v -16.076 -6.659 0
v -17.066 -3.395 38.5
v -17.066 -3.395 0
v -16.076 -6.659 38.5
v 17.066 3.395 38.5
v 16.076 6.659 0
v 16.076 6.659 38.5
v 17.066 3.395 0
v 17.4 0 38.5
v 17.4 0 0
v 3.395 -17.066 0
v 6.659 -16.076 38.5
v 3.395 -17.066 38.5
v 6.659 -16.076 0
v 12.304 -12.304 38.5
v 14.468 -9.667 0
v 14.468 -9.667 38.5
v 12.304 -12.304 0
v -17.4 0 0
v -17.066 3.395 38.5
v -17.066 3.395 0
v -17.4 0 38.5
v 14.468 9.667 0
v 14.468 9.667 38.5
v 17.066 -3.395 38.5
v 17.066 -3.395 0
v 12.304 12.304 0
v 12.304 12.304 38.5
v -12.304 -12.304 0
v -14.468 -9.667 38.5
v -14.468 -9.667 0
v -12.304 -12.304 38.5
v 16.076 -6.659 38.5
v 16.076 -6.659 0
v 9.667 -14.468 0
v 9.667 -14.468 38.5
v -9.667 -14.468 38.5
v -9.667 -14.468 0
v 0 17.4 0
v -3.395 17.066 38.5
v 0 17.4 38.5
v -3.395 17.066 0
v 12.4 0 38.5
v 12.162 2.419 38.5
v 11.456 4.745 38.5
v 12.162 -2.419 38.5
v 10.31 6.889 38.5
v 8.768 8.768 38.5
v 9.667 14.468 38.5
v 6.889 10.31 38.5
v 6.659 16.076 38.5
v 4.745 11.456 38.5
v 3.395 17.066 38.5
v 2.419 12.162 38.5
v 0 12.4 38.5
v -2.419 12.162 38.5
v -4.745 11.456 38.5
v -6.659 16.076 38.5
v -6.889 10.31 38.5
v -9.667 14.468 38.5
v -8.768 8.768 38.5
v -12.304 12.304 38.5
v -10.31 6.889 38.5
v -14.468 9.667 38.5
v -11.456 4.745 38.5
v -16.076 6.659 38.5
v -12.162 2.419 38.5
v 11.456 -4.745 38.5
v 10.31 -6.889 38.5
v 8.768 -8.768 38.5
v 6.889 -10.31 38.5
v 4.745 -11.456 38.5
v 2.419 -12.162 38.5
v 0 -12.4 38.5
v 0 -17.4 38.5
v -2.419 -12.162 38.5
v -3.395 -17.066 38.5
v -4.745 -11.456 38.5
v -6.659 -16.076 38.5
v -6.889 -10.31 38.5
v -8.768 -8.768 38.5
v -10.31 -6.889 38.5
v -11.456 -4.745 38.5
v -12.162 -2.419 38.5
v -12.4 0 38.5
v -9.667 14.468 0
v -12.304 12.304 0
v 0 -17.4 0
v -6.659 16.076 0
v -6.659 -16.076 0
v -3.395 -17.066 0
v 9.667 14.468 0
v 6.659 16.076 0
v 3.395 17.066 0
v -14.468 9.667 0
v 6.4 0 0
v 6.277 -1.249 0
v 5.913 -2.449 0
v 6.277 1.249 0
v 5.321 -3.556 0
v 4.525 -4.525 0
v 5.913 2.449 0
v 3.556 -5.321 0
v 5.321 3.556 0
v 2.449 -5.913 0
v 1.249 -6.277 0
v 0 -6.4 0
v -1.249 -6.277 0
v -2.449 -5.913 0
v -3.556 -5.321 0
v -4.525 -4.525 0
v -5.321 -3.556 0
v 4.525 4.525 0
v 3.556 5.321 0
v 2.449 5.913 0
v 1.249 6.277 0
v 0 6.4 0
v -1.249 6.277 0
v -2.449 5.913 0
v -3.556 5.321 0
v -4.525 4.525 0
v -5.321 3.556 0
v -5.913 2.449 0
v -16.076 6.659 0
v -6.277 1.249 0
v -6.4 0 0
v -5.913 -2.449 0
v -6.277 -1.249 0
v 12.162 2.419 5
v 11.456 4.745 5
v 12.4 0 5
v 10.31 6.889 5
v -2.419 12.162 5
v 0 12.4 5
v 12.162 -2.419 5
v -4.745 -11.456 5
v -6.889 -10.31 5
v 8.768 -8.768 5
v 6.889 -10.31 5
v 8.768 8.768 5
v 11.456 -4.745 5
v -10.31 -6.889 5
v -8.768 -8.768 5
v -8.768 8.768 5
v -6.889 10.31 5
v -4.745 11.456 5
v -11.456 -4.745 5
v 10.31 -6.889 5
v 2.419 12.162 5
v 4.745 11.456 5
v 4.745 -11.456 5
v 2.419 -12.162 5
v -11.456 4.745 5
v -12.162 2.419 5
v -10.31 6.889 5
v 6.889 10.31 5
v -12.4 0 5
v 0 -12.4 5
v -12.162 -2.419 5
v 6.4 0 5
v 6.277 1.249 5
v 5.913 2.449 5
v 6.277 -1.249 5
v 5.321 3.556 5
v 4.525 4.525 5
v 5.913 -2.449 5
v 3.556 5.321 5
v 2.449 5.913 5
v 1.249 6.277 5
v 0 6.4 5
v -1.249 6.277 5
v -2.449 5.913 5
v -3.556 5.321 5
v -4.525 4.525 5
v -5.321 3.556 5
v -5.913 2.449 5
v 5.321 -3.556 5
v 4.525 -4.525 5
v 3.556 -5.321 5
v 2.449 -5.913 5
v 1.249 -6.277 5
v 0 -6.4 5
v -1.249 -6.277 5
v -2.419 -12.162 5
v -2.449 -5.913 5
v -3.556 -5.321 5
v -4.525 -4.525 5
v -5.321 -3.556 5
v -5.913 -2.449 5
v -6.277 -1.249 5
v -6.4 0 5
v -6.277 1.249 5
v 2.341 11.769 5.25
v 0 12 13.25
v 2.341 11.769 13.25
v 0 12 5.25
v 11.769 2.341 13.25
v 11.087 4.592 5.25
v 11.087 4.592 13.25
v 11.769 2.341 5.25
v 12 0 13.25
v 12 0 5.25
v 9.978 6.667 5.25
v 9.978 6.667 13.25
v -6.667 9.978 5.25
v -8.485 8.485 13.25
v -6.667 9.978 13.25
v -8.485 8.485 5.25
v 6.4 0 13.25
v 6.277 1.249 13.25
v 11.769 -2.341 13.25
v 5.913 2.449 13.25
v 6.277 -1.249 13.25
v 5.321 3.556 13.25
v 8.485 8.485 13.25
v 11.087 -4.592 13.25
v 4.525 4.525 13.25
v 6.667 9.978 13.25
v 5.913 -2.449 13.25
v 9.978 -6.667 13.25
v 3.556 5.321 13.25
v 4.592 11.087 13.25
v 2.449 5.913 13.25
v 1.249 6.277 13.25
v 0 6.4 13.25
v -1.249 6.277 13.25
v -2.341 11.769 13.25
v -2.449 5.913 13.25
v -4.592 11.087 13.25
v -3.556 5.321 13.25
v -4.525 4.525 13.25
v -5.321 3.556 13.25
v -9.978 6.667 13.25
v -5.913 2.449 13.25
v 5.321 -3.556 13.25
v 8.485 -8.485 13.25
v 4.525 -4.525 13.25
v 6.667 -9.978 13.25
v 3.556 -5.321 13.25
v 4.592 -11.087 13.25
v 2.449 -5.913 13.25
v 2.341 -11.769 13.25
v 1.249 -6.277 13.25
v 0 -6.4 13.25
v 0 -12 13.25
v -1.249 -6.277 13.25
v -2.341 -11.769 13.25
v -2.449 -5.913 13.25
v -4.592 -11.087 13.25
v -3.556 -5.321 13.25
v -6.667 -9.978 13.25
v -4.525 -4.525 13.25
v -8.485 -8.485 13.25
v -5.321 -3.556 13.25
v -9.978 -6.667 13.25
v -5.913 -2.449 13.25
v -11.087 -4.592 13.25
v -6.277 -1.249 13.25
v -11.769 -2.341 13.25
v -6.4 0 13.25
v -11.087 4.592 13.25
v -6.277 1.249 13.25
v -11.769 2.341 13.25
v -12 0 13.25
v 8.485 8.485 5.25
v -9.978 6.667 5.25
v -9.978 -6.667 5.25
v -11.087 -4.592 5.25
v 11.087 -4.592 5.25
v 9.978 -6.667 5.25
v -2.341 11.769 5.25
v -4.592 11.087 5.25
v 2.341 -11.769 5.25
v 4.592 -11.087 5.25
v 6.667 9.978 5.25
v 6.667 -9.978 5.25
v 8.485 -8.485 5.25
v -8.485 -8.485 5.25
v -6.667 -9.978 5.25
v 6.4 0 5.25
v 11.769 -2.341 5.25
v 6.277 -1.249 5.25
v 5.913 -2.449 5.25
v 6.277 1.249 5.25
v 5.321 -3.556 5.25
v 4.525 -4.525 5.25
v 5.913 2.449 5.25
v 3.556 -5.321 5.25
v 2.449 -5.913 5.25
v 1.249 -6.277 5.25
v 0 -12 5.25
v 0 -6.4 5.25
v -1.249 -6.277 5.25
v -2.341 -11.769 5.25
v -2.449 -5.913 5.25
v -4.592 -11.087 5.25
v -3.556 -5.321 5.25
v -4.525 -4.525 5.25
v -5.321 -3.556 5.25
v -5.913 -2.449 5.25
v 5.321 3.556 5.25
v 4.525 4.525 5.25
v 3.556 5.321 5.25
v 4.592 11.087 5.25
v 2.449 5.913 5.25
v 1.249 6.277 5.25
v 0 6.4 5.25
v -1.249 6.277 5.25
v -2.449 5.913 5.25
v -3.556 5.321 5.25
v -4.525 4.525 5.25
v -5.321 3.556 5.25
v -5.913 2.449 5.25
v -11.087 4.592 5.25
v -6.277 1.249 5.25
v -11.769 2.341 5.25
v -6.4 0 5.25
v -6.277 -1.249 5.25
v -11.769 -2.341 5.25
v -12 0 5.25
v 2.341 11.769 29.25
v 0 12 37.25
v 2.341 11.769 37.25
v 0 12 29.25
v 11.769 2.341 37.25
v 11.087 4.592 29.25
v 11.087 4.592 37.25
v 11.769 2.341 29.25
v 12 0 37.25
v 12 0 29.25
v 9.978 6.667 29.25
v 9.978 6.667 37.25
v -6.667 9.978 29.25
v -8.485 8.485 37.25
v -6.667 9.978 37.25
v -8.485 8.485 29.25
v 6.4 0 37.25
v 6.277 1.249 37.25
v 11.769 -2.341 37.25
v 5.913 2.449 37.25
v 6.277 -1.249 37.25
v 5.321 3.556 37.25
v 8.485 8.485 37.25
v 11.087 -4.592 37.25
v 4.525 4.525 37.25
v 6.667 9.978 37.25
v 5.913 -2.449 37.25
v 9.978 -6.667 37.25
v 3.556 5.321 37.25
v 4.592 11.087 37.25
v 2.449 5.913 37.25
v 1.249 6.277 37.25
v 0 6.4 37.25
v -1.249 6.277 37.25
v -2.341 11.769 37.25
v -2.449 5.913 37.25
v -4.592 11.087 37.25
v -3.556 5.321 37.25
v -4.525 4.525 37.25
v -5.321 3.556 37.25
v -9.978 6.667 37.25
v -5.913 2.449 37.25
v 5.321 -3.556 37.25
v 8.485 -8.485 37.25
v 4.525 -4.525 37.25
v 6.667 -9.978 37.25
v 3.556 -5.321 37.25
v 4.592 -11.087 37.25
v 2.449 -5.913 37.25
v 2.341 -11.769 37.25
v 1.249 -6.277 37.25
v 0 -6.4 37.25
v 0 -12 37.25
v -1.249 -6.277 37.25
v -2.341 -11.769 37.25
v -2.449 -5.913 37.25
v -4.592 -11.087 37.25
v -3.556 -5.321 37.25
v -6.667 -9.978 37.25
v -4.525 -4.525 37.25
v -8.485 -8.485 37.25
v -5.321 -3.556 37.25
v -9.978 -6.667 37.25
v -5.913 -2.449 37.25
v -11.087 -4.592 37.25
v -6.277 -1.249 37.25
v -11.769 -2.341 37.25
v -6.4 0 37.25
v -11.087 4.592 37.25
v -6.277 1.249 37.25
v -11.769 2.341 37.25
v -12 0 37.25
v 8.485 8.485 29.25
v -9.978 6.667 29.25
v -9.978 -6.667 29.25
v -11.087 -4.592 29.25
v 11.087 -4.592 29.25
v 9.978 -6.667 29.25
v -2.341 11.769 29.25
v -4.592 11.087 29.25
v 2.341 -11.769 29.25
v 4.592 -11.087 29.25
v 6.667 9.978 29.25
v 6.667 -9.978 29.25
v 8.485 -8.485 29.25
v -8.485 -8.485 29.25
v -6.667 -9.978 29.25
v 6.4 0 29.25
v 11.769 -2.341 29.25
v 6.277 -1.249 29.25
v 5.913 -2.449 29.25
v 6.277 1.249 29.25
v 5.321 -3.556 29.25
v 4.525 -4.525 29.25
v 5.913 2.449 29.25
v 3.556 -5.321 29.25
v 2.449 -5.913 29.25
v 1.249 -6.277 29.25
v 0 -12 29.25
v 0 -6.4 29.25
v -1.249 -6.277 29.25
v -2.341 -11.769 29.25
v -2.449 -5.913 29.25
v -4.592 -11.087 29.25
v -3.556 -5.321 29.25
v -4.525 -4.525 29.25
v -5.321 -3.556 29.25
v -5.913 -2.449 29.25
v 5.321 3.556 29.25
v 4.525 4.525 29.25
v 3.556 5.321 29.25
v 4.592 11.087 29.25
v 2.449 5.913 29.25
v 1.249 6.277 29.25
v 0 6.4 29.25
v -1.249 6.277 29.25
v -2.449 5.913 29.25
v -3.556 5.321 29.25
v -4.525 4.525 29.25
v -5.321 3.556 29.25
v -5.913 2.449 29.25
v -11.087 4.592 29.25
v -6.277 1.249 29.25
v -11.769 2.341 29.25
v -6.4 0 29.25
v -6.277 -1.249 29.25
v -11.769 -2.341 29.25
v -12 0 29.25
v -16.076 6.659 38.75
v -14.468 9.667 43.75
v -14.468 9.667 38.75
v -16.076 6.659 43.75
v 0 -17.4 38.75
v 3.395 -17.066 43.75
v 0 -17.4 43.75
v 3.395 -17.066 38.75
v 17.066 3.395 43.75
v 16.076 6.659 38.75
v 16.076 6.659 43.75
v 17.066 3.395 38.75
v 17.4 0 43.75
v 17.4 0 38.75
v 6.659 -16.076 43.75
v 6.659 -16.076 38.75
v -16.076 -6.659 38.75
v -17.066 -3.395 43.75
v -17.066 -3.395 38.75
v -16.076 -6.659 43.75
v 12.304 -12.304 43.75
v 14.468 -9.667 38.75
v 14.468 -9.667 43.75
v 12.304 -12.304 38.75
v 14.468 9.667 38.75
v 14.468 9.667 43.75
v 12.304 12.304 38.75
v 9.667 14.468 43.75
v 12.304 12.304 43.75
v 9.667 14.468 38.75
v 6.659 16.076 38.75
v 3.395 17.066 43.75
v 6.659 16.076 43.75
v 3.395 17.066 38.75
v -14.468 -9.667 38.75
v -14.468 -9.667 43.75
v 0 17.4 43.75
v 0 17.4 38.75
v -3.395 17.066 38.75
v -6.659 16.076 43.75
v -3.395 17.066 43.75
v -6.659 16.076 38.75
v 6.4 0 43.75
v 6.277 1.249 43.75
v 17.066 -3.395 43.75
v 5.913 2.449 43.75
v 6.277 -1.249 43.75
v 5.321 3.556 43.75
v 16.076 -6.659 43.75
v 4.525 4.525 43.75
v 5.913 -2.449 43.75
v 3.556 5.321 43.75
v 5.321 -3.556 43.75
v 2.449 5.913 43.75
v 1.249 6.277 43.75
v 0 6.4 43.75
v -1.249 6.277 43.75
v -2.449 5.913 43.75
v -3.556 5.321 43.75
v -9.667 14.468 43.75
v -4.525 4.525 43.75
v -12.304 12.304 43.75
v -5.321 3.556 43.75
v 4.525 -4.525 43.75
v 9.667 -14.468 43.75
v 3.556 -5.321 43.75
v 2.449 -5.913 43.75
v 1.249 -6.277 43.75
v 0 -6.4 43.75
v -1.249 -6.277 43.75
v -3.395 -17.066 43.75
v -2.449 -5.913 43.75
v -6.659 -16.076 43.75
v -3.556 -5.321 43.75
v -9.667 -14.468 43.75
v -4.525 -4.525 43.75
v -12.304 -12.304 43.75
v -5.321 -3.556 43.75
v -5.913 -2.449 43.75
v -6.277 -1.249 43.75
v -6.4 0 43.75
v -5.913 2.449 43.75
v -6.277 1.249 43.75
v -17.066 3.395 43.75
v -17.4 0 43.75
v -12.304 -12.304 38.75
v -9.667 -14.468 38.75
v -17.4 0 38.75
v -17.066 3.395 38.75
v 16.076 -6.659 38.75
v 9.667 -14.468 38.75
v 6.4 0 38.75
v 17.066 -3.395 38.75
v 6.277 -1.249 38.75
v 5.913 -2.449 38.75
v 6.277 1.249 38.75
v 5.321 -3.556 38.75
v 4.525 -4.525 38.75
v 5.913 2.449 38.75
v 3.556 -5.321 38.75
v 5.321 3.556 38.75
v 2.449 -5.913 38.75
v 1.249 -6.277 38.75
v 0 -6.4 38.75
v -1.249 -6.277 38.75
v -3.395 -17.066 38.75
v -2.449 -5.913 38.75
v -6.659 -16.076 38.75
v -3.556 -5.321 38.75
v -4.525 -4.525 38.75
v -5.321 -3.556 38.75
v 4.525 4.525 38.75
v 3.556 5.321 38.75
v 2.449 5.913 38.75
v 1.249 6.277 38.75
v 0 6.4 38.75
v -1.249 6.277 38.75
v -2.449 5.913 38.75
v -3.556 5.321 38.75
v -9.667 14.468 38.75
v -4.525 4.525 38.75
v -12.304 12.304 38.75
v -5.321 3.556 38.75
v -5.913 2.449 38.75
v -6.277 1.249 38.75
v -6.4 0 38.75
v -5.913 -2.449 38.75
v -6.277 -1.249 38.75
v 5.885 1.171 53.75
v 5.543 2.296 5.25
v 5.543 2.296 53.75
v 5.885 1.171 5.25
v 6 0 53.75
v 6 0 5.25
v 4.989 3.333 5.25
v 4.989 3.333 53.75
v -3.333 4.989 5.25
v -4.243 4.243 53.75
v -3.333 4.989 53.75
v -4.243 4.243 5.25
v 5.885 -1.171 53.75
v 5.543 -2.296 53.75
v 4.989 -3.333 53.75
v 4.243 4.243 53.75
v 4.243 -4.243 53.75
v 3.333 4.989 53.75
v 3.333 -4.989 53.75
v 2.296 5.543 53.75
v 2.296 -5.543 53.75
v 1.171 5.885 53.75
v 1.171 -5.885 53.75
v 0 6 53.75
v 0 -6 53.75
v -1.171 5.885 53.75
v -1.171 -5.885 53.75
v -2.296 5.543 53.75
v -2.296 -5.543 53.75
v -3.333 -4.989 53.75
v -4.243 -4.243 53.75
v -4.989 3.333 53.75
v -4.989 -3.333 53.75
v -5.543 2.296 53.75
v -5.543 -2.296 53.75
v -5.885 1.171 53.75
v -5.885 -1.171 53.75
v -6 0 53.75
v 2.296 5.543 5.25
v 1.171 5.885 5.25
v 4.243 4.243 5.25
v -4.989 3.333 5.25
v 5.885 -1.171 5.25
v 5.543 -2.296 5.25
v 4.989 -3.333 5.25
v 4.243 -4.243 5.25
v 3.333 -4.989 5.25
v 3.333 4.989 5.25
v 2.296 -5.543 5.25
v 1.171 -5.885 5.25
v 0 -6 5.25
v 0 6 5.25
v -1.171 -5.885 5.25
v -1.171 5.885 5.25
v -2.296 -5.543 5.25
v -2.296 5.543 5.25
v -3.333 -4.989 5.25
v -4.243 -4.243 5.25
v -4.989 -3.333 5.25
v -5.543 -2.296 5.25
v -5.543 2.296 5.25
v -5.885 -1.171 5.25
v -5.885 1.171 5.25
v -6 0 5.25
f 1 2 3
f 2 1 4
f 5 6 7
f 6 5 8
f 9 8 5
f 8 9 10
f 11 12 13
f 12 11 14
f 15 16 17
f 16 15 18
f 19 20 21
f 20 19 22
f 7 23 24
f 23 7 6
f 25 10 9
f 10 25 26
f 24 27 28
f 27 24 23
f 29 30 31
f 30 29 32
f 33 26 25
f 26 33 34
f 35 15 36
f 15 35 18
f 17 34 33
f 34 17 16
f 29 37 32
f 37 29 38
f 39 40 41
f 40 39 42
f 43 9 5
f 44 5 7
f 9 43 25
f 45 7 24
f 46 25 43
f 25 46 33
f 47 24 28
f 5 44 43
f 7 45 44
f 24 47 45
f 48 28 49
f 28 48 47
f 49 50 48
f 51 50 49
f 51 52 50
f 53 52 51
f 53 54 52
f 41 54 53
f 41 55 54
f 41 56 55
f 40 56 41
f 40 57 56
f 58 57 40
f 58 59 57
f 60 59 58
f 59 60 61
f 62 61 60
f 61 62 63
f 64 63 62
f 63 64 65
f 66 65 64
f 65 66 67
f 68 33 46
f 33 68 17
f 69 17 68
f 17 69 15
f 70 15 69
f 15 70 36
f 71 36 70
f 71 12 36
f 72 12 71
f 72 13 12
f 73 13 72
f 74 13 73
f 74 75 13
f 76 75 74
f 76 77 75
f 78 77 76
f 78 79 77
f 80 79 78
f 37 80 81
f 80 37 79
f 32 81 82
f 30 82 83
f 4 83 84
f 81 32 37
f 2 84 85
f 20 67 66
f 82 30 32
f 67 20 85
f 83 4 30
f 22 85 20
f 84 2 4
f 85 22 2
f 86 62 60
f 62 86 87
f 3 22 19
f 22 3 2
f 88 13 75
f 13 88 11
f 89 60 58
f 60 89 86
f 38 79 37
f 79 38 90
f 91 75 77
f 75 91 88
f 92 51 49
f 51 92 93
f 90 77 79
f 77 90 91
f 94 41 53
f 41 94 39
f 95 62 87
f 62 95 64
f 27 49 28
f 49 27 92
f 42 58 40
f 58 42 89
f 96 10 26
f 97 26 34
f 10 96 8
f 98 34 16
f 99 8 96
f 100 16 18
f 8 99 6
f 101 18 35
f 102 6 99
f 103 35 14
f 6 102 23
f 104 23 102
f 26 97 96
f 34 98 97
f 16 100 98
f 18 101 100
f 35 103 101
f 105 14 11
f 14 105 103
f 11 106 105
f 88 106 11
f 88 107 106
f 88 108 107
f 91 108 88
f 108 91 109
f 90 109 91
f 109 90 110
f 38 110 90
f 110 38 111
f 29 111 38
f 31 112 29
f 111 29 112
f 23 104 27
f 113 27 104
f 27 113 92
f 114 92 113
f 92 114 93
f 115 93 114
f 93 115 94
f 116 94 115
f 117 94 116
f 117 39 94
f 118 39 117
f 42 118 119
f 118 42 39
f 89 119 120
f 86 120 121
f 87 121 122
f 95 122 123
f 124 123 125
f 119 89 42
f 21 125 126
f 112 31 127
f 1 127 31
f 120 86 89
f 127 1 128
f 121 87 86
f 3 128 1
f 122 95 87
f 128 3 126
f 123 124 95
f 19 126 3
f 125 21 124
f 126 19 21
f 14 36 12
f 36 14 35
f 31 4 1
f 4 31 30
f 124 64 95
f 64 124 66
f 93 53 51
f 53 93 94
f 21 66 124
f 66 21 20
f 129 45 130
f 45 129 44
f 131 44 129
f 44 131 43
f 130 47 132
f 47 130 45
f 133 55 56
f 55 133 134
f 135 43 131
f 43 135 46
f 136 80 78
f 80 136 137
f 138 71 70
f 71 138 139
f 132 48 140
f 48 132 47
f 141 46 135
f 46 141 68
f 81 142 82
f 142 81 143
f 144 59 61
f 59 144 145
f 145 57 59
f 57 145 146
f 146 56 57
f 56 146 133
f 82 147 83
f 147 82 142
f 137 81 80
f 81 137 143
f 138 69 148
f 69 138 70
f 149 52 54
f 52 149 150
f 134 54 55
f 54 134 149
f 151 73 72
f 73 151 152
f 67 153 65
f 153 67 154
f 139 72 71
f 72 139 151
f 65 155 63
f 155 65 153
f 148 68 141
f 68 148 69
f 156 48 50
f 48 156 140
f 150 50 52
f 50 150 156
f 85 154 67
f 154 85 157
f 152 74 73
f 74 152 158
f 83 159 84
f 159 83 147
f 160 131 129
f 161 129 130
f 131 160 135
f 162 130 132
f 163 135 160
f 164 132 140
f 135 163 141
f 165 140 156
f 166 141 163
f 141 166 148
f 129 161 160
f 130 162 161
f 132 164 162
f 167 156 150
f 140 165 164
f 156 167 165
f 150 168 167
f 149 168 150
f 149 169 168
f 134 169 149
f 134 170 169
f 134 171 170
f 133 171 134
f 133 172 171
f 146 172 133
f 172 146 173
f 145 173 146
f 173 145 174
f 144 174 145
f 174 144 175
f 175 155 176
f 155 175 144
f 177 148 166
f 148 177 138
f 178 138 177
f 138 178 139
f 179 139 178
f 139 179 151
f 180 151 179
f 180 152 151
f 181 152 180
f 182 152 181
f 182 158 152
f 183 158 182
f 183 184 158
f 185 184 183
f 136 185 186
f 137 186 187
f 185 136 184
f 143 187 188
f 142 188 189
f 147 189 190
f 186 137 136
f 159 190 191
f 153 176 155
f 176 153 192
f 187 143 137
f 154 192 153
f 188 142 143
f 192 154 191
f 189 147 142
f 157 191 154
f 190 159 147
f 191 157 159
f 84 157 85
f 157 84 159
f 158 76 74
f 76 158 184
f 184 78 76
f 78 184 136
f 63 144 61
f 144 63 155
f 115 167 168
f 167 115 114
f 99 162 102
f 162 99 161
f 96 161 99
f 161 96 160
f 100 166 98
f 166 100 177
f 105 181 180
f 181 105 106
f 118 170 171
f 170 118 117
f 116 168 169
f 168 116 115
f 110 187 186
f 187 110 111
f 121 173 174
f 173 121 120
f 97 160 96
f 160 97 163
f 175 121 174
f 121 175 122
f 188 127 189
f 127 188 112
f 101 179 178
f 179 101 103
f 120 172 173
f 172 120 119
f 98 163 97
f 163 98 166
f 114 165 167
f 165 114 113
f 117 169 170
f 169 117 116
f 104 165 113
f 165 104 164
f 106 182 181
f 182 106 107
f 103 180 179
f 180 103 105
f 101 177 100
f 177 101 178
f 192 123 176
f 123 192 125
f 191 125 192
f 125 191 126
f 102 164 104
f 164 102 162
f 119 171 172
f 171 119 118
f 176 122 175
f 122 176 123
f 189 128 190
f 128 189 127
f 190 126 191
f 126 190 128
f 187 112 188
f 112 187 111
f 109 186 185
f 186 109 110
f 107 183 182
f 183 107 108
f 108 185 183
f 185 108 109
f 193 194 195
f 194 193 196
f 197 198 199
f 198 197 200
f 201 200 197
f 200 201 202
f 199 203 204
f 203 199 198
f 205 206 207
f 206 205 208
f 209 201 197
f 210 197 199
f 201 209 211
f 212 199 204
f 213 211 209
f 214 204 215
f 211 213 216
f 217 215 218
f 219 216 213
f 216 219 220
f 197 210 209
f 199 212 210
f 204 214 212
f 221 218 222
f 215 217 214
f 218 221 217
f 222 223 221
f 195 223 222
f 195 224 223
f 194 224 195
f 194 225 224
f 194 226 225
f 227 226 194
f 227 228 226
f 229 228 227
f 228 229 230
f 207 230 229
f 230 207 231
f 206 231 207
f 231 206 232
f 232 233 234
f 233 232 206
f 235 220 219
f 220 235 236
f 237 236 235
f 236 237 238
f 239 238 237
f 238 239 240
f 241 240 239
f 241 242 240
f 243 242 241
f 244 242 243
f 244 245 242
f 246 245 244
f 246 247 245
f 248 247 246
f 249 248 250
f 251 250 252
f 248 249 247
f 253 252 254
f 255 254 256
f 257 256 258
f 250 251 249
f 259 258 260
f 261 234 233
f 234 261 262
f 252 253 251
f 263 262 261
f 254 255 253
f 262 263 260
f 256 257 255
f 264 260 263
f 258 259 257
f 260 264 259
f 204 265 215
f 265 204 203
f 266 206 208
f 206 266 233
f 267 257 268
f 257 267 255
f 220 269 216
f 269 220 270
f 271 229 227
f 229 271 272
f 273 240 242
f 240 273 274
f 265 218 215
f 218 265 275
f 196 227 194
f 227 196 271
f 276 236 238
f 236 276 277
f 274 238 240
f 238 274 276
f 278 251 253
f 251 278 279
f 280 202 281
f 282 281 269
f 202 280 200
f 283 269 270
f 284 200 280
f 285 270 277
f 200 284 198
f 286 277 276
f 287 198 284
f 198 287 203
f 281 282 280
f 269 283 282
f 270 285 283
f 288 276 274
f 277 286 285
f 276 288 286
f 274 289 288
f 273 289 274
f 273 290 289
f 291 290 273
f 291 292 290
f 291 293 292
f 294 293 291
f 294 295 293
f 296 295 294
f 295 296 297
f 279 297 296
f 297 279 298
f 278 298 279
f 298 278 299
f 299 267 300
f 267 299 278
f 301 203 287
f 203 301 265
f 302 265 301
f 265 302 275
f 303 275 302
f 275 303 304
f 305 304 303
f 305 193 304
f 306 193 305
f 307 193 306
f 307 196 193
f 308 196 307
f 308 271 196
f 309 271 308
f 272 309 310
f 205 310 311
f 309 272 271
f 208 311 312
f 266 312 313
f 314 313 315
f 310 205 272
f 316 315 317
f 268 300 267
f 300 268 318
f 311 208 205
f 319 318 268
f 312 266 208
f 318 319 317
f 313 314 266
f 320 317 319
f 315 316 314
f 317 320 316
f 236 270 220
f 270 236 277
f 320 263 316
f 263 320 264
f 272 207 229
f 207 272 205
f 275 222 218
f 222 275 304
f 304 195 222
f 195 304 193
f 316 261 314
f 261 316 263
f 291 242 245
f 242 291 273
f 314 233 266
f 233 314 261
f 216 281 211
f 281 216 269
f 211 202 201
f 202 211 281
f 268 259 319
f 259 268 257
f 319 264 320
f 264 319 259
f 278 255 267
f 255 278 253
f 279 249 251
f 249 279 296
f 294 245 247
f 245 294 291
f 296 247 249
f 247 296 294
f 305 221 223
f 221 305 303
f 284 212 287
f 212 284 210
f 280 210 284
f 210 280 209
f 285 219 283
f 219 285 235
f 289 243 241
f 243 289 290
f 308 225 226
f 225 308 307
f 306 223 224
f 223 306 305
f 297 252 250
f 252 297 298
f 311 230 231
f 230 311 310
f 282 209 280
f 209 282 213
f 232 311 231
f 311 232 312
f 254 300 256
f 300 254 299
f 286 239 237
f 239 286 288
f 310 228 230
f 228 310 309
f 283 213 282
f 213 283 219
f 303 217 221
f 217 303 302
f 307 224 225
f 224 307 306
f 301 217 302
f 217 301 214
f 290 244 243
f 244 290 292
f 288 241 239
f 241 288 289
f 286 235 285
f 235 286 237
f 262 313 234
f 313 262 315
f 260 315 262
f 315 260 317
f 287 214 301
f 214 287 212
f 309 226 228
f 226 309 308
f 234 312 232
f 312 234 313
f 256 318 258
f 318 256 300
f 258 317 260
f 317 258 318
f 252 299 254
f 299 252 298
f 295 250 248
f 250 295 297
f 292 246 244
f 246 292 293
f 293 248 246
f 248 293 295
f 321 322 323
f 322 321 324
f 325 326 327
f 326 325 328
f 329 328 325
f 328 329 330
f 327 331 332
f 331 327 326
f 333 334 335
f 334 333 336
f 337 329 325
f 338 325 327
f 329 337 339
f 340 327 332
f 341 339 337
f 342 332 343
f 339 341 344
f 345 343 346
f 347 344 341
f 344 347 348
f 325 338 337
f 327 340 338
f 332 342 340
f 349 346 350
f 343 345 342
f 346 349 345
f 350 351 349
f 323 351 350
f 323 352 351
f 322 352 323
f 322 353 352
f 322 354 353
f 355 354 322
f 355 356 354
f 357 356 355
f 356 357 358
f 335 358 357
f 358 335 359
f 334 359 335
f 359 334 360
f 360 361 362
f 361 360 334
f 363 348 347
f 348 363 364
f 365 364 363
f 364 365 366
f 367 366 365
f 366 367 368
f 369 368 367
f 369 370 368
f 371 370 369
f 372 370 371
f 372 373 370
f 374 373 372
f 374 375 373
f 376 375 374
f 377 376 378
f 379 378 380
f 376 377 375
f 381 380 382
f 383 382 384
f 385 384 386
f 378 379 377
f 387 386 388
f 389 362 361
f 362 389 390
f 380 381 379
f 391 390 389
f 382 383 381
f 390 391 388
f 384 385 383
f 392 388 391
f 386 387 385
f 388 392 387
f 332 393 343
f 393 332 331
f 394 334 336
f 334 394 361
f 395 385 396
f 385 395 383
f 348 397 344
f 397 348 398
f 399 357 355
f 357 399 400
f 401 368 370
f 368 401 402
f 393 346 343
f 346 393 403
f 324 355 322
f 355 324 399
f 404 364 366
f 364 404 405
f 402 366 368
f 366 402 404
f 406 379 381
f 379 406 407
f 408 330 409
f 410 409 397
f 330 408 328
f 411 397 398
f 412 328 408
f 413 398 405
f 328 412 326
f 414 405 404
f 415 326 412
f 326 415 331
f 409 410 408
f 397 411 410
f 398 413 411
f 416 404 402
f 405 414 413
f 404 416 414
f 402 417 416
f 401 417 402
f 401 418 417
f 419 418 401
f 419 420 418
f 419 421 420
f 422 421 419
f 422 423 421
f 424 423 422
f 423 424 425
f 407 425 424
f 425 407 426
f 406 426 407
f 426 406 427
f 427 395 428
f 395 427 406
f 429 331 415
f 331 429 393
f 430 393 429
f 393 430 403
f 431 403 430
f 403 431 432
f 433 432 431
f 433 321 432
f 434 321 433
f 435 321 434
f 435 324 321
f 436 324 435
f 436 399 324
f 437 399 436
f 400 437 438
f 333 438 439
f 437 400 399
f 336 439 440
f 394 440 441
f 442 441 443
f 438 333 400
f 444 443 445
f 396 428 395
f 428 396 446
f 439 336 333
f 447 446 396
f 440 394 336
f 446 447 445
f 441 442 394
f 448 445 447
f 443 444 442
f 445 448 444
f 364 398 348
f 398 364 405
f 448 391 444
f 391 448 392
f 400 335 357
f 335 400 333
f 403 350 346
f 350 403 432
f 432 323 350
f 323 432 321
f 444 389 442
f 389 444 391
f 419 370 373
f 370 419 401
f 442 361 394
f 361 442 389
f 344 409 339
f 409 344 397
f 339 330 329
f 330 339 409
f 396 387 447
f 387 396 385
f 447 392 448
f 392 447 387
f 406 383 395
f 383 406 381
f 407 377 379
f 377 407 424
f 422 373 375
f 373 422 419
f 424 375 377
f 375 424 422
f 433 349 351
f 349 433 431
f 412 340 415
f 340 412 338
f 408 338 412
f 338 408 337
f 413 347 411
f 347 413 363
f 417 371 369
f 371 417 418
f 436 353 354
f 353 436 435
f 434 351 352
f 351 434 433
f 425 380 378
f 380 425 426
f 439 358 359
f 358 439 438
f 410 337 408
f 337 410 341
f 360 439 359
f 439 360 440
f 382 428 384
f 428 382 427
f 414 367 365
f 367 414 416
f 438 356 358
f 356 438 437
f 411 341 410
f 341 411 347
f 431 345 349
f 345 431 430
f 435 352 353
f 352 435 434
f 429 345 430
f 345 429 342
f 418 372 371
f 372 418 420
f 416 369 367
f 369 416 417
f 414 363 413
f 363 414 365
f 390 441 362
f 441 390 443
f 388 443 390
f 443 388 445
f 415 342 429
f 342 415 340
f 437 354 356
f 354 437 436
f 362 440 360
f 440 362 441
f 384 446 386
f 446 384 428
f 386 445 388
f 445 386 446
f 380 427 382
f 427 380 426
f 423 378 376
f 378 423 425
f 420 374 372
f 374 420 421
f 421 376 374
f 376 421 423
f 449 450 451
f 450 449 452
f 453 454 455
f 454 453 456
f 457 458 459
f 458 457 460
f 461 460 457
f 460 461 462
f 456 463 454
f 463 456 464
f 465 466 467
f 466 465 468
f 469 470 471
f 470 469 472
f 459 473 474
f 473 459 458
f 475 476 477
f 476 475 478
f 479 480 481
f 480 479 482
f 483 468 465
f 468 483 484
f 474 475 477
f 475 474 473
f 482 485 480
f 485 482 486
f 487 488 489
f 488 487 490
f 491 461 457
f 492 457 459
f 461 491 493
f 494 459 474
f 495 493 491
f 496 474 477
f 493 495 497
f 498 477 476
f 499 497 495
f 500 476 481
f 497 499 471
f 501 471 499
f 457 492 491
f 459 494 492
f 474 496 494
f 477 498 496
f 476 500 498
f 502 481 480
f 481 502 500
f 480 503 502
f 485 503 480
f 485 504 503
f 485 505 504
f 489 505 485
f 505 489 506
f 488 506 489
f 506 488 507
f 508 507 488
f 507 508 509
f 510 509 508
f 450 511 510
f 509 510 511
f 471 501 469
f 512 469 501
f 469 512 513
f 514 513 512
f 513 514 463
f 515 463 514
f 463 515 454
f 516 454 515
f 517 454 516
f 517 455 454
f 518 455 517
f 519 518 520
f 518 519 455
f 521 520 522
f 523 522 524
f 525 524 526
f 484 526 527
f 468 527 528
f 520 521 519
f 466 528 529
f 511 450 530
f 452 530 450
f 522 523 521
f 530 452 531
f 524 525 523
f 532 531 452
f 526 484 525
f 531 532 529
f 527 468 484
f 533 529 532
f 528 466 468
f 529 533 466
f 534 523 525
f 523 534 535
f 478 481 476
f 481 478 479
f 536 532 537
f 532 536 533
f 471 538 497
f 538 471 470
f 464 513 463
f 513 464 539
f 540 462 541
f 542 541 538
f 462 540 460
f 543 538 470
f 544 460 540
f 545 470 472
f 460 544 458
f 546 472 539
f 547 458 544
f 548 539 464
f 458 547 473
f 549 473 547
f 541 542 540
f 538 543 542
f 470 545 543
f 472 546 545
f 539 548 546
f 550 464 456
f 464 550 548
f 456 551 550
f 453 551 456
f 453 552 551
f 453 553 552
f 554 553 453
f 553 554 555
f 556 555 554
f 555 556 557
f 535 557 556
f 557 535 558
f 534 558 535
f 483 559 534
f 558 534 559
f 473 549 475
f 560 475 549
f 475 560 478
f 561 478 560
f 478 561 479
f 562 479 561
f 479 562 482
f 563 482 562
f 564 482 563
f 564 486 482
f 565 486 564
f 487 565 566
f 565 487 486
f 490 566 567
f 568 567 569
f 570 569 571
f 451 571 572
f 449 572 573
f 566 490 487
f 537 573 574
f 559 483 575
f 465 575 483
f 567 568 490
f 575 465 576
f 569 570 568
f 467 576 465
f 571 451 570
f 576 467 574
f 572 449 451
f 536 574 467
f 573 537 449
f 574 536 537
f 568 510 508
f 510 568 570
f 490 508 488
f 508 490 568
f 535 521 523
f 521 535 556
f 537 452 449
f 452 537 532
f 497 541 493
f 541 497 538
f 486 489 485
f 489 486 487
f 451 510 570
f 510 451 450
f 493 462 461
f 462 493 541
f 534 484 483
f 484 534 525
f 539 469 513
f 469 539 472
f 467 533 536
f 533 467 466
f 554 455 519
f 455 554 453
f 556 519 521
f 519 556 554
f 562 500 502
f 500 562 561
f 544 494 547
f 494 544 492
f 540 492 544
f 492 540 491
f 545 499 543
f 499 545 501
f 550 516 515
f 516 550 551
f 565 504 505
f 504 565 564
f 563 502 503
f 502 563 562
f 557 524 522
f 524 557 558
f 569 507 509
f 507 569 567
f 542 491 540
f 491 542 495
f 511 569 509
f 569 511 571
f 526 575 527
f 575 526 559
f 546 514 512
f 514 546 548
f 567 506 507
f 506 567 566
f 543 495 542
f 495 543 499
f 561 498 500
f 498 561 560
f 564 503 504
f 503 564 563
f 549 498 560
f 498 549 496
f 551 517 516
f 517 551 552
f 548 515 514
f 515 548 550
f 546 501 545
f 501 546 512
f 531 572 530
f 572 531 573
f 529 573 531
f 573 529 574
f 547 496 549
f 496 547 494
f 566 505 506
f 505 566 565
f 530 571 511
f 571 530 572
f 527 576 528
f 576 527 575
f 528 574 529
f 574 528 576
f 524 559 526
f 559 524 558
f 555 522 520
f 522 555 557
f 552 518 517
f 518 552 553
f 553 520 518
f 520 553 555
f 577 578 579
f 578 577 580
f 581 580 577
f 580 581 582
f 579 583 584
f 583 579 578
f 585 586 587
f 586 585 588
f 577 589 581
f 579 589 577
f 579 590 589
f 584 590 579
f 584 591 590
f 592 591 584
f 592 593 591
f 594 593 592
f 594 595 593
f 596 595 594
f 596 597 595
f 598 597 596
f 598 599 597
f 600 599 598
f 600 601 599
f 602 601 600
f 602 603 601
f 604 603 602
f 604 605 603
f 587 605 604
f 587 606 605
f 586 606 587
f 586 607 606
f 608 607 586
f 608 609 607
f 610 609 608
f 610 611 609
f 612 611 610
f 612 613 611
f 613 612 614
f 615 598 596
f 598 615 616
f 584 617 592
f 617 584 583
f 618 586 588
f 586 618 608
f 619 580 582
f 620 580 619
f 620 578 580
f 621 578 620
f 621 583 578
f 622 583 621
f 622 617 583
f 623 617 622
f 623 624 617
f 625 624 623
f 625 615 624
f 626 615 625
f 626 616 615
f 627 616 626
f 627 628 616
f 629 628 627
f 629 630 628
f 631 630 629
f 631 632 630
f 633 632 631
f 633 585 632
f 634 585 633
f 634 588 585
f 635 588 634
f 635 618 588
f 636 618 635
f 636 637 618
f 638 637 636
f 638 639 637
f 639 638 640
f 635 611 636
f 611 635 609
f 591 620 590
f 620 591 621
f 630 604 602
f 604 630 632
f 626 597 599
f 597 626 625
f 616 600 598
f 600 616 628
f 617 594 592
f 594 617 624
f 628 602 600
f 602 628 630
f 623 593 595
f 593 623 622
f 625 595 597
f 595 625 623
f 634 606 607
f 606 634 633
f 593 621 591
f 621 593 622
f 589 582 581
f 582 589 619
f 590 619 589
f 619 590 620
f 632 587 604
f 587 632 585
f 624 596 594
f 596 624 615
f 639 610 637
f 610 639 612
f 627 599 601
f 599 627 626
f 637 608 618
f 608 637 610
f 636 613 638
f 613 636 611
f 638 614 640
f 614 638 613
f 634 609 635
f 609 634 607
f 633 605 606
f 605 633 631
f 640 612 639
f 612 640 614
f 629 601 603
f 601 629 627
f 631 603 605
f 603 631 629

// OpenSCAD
$fn = 32;

// ------------------------------------------------------------------------
// Shaft station: cup d34.8 x 38.5 mm, shaft d12
// Every part is its own module, assembly() places every instance.
// ------------------------------------------------------------------------

// --- part 1 ---
module housing_cup() {
  difference() {
    cylinder(h = 38.5, d = 34.8);
    translate([0, 0, 5]) cylinder(h = 34.5, d = 24.8);
    translate([0, 0, -1]) cylinder(h = 7, d = 12.8);
  }
}

// --- part 2 ---
module bearing_lower() {
  difference() {
      translate([0, 0, 0]) cylinder(h = 8, d = 24);
      translate([0, 0, -1]) cylinder(h = 10, d = 12.8);
    }
}

// --- part 3 ---
module bearing_upper() {
  difference() {
      translate([0, 0, 0]) cylinder(h = 8, d = 24);
      translate([0, 0, -1]) cylinder(h = 10, d = 12.8);
    }
}

// --- part 4 ---
module station_shaft() {
  translate([0, 0, -24.25]) cylinder(h = 48.5, d = 12);
}

// --- part 5 ---
module station_cover() {
  difference() {
    cylinder(h = 5, d = 34.8);
    translate([0, 0, -1]) cylinder(h = 7, d = 12.8);
  }
}

// --- assembly ---
module assembly() {
  color([0.80, 0.24, 0.20]) translate([0, 0, 0]) rotate([0, 0, 0]) housing_cup();
  color([0.20, 0.45, 0.75]) translate([0, 0, 5.25]) rotate([0, 0, 0]) bearing_lower();
  color([0.25, 0.62, 0.32]) translate([0, 0, 29.25]) rotate([0, 0, 0]) bearing_upper();
  color([0.92, 0.70, 0.18]) translate([0, 0, 29.5]) rotate([0, 0, 0]) station_shaft();
  color([0.58, 0.35, 0.70]) translate([0, 0, 38.75]) rotate([0, 0, 0]) station_cover();
}

assembly();
